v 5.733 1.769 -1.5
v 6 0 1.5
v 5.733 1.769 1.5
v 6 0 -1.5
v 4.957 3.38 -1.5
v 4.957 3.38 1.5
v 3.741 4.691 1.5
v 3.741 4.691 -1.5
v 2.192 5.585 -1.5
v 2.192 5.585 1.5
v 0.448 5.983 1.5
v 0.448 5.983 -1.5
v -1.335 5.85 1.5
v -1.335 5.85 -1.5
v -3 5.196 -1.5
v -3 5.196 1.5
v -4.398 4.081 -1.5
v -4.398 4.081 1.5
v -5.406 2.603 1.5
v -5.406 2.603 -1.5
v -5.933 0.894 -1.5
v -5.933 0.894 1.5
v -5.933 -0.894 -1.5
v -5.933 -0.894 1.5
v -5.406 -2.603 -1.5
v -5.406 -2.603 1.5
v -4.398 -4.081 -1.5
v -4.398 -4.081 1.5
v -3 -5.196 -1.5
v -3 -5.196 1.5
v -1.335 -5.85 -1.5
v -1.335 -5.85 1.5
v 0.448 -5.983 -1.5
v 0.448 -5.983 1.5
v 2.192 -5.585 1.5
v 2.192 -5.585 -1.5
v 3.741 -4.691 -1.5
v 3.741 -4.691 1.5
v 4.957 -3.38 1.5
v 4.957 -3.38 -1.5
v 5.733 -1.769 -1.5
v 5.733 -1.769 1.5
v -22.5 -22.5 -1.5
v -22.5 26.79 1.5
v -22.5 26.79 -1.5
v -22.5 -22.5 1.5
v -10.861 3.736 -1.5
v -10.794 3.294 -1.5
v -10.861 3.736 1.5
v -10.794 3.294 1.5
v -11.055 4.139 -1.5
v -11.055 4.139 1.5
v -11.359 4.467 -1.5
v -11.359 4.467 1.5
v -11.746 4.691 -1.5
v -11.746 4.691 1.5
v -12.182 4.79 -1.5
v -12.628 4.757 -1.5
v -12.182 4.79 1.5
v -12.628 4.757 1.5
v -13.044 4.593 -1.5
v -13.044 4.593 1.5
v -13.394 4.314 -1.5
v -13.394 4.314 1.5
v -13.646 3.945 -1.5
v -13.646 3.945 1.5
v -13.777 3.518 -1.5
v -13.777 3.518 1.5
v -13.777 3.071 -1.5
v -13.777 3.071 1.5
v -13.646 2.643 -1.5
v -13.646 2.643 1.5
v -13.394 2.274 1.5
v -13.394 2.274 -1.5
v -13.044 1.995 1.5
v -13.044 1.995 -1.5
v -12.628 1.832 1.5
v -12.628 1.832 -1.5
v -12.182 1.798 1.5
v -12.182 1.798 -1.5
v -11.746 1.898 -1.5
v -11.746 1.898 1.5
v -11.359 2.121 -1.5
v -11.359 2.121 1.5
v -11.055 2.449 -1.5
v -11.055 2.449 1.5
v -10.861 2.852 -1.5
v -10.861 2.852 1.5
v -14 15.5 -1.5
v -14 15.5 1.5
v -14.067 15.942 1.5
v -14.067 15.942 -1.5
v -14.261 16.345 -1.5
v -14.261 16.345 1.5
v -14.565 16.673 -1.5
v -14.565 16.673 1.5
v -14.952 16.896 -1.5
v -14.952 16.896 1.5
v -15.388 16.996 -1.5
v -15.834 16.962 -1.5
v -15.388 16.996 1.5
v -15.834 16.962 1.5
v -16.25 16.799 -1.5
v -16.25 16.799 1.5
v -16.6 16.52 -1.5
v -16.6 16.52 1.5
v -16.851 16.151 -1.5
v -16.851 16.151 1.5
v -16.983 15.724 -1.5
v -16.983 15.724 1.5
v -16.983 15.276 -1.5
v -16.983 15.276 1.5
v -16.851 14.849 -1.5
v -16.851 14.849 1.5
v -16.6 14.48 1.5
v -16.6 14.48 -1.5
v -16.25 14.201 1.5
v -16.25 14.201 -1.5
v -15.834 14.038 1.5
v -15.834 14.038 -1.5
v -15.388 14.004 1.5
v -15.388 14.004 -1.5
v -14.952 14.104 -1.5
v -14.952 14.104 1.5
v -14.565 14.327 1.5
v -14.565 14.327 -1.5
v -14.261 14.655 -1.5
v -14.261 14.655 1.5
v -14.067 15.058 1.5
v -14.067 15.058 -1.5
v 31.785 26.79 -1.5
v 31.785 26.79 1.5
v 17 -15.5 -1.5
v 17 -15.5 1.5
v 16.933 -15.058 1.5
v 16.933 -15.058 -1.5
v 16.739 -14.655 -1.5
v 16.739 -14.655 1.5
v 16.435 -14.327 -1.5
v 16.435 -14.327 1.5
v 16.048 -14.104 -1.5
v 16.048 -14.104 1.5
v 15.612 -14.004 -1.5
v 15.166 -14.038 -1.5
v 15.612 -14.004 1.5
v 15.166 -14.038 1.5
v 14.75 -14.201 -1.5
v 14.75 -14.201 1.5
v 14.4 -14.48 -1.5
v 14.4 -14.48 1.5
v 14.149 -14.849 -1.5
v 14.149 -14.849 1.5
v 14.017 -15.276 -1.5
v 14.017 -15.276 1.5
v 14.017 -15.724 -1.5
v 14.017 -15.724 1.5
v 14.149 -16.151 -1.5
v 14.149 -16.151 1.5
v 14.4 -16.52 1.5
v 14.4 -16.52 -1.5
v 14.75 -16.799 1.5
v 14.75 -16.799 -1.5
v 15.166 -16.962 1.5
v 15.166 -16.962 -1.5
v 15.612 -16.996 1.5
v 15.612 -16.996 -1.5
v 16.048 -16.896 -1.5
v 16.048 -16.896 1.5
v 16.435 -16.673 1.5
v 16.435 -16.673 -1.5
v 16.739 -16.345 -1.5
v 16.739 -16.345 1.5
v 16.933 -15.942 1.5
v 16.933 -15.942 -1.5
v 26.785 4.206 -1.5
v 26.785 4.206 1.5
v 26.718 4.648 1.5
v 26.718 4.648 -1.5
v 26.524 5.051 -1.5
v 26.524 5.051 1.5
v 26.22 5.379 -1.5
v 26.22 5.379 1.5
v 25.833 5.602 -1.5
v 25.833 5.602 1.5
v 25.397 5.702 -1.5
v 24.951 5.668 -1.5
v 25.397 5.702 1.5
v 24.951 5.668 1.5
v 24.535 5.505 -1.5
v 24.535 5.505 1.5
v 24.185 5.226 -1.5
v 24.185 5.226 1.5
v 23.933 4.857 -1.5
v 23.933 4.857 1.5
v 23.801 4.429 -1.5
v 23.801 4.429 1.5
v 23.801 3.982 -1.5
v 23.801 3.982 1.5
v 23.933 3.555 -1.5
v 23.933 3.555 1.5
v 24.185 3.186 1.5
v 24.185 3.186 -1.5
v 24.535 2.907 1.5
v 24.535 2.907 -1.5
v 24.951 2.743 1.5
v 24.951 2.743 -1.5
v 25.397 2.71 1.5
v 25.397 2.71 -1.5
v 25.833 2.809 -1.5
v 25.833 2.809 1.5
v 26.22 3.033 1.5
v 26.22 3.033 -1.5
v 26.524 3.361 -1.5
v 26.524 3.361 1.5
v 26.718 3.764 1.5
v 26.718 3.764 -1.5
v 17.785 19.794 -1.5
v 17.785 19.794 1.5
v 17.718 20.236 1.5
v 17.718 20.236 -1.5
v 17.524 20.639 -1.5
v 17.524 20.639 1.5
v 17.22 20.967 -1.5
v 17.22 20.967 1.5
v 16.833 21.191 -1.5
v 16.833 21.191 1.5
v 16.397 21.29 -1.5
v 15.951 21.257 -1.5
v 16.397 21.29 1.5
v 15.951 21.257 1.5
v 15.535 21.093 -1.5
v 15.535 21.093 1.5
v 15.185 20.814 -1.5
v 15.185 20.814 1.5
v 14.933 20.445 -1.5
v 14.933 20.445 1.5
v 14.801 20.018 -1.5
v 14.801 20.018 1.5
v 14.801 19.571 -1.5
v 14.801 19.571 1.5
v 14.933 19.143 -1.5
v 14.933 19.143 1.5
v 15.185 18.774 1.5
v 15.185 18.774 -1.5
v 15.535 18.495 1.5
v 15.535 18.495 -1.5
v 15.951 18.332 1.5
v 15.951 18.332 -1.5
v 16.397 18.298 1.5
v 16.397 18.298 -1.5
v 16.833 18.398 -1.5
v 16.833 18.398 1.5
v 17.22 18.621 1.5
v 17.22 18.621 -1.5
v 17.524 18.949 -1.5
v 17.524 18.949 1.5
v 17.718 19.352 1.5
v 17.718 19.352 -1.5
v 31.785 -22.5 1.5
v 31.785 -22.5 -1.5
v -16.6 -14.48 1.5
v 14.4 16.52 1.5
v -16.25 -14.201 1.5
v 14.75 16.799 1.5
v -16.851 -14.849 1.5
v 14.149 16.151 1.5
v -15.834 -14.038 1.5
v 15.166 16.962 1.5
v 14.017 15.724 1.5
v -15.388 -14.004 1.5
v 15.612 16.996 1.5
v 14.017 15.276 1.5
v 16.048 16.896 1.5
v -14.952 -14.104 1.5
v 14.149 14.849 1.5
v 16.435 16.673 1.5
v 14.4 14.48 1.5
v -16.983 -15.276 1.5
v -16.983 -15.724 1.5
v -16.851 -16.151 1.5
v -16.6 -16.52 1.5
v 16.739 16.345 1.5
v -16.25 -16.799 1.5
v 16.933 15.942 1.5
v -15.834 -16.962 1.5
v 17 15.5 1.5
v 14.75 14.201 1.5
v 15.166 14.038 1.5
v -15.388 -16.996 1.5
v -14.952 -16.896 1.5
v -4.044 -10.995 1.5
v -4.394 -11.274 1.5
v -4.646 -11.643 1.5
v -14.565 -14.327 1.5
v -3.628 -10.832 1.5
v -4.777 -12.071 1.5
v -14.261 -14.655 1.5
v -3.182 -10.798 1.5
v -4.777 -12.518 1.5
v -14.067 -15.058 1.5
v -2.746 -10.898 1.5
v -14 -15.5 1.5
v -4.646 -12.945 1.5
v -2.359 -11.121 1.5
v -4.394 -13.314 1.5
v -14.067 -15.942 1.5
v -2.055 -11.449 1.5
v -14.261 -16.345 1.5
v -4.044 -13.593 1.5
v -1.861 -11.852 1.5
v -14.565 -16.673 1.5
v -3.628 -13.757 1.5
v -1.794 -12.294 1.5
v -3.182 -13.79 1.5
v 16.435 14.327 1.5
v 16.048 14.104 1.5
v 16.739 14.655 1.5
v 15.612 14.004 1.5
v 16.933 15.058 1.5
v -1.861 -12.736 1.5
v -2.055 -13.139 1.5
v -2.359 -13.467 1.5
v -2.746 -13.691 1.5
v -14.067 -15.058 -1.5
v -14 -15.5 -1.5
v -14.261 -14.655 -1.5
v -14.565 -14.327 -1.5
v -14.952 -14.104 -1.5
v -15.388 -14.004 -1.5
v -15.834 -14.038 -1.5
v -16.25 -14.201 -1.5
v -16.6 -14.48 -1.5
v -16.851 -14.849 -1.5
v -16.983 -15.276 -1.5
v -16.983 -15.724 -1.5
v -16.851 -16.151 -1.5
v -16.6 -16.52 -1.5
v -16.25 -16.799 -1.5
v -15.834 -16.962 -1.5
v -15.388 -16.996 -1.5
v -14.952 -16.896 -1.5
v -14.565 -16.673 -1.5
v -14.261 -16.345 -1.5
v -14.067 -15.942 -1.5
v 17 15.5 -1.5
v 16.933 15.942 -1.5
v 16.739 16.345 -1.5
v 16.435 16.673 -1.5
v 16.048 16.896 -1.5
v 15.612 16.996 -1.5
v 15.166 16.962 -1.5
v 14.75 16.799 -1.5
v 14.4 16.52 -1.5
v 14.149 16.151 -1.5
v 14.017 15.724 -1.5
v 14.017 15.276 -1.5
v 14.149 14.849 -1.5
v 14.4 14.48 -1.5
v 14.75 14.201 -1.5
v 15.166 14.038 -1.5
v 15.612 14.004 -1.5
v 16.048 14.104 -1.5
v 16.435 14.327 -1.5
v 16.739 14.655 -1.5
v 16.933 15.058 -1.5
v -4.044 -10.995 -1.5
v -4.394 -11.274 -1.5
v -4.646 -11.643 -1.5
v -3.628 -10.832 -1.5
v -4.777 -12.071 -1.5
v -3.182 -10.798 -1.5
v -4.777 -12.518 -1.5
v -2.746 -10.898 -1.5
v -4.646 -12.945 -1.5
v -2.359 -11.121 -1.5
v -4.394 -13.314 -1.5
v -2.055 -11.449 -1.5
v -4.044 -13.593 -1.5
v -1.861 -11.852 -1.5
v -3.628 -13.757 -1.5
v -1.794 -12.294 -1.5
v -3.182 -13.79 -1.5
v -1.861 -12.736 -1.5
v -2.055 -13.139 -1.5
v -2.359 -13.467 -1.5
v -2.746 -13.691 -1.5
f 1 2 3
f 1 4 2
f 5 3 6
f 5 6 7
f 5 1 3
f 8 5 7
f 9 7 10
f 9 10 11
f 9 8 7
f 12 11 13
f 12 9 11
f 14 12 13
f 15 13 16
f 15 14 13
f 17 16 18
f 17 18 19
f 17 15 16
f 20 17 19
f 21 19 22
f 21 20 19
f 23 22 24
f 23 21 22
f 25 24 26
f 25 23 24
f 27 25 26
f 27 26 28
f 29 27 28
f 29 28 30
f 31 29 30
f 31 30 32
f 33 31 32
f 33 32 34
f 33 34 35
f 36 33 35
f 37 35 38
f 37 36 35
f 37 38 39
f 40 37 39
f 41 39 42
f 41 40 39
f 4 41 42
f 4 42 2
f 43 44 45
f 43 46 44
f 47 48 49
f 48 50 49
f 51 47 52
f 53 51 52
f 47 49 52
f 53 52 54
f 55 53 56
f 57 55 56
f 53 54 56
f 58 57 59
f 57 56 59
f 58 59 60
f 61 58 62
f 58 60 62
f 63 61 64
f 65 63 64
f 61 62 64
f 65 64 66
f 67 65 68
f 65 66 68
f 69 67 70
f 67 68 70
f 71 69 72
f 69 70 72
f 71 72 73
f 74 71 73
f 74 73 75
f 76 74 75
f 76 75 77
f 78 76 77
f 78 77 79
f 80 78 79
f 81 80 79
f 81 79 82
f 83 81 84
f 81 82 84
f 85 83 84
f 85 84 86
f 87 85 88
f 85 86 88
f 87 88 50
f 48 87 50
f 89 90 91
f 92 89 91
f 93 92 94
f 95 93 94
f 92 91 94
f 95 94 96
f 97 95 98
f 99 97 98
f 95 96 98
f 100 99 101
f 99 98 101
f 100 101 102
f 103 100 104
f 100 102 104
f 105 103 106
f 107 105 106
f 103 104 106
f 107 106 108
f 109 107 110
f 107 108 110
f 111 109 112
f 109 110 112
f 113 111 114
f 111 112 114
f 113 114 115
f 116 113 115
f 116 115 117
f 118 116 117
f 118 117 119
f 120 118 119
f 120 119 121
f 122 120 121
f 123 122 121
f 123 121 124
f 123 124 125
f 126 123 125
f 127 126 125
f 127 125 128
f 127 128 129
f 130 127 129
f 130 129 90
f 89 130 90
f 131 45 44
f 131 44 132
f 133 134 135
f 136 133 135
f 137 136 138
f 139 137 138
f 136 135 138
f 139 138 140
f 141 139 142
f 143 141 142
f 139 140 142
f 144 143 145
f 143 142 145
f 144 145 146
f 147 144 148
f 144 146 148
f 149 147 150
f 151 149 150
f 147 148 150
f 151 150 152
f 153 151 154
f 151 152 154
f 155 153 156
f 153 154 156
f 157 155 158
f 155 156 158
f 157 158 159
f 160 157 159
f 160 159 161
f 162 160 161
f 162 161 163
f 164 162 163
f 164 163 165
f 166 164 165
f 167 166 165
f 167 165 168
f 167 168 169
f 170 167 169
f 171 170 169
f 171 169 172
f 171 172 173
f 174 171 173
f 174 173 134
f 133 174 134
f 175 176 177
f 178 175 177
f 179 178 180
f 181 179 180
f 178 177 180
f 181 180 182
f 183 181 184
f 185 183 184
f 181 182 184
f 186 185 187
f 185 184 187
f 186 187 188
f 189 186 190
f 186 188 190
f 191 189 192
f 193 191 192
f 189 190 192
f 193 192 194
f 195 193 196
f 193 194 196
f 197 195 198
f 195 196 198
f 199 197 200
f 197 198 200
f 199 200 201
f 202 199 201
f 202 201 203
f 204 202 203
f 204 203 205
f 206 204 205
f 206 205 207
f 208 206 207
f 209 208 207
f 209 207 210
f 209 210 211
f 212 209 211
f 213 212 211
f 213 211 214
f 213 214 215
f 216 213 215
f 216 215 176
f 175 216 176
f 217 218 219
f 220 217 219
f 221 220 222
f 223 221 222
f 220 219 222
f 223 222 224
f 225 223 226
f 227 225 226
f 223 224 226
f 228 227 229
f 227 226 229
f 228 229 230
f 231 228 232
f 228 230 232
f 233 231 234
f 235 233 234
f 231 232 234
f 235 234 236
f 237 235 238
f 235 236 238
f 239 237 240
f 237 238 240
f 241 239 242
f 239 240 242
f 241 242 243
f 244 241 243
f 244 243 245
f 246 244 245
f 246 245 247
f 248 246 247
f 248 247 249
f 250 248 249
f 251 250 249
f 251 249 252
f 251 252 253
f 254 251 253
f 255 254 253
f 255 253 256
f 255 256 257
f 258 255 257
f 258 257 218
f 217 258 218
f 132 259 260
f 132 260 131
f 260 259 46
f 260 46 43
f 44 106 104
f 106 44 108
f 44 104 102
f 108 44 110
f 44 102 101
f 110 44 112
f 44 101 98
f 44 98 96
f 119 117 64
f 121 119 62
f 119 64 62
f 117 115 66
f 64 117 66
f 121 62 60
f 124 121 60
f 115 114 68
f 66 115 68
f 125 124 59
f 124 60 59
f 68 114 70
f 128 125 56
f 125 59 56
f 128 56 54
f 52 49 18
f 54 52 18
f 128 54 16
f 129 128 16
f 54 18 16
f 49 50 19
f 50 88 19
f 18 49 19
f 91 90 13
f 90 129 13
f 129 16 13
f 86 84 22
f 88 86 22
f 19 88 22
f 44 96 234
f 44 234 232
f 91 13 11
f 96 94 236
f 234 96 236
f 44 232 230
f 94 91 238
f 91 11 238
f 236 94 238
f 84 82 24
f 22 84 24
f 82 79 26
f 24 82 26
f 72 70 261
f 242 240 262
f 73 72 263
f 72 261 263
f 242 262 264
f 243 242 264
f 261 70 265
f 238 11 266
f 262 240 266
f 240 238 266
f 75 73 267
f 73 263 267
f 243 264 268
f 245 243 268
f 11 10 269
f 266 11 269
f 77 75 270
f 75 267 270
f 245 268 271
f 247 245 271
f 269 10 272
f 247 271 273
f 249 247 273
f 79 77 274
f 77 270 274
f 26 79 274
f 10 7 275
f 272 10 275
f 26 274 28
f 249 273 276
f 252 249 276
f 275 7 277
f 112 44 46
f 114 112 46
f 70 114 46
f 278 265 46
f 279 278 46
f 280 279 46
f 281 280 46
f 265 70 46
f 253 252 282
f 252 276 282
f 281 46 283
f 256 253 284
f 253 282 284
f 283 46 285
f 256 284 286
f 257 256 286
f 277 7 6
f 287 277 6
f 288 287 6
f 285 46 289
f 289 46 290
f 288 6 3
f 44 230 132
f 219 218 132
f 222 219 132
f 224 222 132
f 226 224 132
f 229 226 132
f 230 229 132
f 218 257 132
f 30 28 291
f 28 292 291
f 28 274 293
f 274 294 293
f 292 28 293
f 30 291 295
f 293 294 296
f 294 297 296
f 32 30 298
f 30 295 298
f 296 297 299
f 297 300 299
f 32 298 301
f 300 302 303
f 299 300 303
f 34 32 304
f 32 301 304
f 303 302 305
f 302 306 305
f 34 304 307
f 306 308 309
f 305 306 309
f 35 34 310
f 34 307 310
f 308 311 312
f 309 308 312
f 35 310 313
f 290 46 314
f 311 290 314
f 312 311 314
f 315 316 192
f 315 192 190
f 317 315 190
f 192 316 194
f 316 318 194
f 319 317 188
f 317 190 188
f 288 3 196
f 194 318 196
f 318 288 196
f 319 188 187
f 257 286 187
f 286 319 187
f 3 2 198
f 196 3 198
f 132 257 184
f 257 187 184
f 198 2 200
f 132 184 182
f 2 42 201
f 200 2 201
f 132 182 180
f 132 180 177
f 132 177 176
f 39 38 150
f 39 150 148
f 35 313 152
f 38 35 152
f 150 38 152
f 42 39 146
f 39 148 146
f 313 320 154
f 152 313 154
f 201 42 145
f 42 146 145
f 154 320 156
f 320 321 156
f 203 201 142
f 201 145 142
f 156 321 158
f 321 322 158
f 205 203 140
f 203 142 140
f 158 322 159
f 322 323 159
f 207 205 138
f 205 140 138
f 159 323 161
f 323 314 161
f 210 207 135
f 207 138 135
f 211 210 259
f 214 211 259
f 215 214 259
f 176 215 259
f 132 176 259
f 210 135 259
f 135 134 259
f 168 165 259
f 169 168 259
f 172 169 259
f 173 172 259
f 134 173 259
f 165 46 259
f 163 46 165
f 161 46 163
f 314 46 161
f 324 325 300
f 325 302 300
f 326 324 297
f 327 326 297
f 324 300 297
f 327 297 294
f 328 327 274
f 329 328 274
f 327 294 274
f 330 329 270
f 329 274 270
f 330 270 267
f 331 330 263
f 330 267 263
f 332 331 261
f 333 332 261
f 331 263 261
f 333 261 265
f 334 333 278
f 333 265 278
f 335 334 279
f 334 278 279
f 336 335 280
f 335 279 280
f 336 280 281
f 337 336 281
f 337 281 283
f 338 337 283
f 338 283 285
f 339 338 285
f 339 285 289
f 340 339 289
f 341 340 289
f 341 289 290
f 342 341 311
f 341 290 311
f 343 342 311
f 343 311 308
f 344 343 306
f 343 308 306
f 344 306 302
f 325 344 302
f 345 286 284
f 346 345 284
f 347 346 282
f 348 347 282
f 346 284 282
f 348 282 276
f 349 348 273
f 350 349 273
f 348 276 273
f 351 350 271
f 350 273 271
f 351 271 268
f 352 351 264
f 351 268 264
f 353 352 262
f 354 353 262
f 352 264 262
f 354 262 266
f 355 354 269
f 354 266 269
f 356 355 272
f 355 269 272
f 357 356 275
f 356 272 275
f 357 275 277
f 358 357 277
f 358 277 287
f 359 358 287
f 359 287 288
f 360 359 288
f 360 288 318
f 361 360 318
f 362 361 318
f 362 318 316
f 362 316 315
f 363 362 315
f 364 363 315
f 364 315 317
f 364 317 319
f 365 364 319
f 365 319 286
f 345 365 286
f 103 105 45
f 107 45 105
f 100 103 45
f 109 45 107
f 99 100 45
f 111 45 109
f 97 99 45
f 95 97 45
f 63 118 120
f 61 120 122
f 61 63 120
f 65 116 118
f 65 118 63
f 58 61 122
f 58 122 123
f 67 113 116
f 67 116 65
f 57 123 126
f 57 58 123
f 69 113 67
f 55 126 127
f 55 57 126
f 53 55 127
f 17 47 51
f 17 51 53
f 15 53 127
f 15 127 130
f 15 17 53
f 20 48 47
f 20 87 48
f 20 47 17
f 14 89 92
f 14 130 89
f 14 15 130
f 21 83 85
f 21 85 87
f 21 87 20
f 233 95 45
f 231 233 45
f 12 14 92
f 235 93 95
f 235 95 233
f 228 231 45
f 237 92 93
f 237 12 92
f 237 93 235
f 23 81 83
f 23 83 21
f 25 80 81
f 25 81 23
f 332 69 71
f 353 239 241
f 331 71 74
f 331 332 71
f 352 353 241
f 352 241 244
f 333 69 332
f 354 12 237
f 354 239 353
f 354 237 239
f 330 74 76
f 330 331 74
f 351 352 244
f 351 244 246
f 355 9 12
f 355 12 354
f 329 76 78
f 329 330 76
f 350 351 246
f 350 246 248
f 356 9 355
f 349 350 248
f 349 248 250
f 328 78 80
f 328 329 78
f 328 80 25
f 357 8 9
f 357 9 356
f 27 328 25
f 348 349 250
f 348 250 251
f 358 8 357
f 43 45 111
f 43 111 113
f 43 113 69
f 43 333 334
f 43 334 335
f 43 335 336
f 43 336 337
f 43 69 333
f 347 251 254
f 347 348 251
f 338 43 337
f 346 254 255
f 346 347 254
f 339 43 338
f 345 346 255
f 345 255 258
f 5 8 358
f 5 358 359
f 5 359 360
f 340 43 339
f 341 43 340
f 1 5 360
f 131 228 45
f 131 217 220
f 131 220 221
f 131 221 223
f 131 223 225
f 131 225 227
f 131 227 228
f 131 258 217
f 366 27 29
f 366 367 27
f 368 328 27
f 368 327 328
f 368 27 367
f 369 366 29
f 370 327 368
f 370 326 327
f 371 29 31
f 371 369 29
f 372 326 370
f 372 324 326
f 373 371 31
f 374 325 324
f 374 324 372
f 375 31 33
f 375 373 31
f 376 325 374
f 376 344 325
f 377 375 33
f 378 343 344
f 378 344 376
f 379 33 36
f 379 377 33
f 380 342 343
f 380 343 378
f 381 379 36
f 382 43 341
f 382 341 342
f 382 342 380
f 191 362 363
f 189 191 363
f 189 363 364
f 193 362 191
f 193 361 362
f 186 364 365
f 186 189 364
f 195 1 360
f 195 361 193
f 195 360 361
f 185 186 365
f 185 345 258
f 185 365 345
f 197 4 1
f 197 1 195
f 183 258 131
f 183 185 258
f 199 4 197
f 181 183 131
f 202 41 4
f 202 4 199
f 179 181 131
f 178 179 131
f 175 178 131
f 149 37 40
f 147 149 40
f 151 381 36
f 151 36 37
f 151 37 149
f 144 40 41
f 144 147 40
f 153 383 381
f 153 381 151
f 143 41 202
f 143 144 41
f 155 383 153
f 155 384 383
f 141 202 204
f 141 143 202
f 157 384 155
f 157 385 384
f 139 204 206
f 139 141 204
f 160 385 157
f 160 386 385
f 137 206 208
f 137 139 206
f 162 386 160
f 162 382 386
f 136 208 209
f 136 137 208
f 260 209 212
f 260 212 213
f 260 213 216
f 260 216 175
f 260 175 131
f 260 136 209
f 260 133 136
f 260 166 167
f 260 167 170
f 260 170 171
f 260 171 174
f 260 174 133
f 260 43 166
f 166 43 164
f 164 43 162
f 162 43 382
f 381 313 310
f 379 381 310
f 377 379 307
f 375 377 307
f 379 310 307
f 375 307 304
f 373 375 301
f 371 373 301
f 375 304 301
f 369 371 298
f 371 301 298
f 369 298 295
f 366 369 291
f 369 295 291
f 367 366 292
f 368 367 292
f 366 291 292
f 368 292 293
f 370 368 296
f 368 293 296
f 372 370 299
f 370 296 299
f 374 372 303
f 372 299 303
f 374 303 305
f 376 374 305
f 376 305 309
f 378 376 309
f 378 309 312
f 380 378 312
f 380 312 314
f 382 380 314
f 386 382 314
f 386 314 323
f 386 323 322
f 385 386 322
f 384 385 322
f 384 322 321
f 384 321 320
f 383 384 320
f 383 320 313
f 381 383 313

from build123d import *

# Parameters (mm, degrees)
SKETCH1_W           = 45
SKETCH1_H           = 45
SKETCH1_R           = 6
BOSS_EXTRUDE1_DEPTH = 1.5
SKETCH4_W           = 3
SKETCH4_H           = 45
BOSS_EXTRUDE2_DEPTH = 20
SKETCH2_R           = 1.5
CUT_EXTRUDE1_DEPTH  = 5
SKETCH3_R           = 1.5
CUT_EXTRUDE2_DEPTH  = 5
SKETCH5_W           = 65
SKETCH5_H           = 3
BOSS_EXTRUDE3_DEPTH = 4.29
SKETCH6_W           = 10.715390309
SKETCH6_H           = 49.29
CUT_EXTRUDE3_DEPTH  = 4.29


with BuildPart() as part:
    # Sketch1 → Boss-Extrude1 (new, symmetric)
    with BuildSketch(Plane.XY):
        Rectangle(SKETCH1_W, SKETCH1_H)
        Circle(SKETCH1_R, mode=Mode.SUBTRACT)
    extrude(amount=BOSS_EXTRUDE1_DEPTH, both=True)

    # Sketch4 → Boss-Extrude2 (add)
    with BuildSketch(Plane(origin=(22.5, 0, 0), x_dir=(0, 0, -1), z_dir=(1, 0, 0))):
        Rectangle(SKETCH4_W, SKETCH4_H)
    extrude(amount=BOSS_EXTRUDE2_DEPTH)

    # Sketch2 → Cut-Extrude1 (cut, symmetric)
    with BuildSketch(Plane.XY.offset(1.5)):
        with Locations((-15.5, 15.5)):
            Circle(SKETCH2_R)
        with Locations((15.5, 15.5)):
            Circle(SKETCH2_R)
        with Locations((15.5, -15.5)):
            Circle(SKETCH2_R)
        with Locations((-15.5, -15.5)):
            Circle(SKETCH2_R)
    extrude(amount=CUT_EXTRUDE1_DEPTH, both=True, mode=Mode.SUBTRACT)

    # Sketch3 → Cut-Extrude2 (cut, symmetric)
    with BuildSketch(Plane.XY.offset(1.5)):
        with Locations((-3.294228634, -12.294228634)):
            Circle(SKETCH3_R)
        with Locations((25.284609691, 4.205771366)):
            Circle(SKETCH3_R)
        with Locations((16.284609691, 19.794228634)):
            Circle(SKETCH3_R)
        with Locations((-12.294228634, 3.294228634)):
            Circle(SKETCH3_R)
    extrude(amount=CUT_EXTRUDE2_DEPTH, both=True, mode=Mode.SUBTRACT)

    # Sketch5 → Boss-Extrude3 (add)
    with BuildSketch(Plane(origin=(0, 22.5, 0), x_dir=(1, 0, 0), z_dir=(0, 1, 0))):
        with Locations((10, 0)):
            Rectangle(SKETCH5_W, SKETCH5_H)
    extrude(amount=BOSS_EXTRUDE3_DEPTH)

    # Sketch6 → Cut-Extrude3 (cut)
    with BuildSketch(Plane.XY.offset(1.5)):
        with Locations((37.142304845, 2.145)):
            Rectangle(SKETCH6_W, SKETCH6_H)
    extrude(amount=-CUT_EXTRUDE3_DEPTH, mode=Mode.SUBTRACT)


solid = part.part
